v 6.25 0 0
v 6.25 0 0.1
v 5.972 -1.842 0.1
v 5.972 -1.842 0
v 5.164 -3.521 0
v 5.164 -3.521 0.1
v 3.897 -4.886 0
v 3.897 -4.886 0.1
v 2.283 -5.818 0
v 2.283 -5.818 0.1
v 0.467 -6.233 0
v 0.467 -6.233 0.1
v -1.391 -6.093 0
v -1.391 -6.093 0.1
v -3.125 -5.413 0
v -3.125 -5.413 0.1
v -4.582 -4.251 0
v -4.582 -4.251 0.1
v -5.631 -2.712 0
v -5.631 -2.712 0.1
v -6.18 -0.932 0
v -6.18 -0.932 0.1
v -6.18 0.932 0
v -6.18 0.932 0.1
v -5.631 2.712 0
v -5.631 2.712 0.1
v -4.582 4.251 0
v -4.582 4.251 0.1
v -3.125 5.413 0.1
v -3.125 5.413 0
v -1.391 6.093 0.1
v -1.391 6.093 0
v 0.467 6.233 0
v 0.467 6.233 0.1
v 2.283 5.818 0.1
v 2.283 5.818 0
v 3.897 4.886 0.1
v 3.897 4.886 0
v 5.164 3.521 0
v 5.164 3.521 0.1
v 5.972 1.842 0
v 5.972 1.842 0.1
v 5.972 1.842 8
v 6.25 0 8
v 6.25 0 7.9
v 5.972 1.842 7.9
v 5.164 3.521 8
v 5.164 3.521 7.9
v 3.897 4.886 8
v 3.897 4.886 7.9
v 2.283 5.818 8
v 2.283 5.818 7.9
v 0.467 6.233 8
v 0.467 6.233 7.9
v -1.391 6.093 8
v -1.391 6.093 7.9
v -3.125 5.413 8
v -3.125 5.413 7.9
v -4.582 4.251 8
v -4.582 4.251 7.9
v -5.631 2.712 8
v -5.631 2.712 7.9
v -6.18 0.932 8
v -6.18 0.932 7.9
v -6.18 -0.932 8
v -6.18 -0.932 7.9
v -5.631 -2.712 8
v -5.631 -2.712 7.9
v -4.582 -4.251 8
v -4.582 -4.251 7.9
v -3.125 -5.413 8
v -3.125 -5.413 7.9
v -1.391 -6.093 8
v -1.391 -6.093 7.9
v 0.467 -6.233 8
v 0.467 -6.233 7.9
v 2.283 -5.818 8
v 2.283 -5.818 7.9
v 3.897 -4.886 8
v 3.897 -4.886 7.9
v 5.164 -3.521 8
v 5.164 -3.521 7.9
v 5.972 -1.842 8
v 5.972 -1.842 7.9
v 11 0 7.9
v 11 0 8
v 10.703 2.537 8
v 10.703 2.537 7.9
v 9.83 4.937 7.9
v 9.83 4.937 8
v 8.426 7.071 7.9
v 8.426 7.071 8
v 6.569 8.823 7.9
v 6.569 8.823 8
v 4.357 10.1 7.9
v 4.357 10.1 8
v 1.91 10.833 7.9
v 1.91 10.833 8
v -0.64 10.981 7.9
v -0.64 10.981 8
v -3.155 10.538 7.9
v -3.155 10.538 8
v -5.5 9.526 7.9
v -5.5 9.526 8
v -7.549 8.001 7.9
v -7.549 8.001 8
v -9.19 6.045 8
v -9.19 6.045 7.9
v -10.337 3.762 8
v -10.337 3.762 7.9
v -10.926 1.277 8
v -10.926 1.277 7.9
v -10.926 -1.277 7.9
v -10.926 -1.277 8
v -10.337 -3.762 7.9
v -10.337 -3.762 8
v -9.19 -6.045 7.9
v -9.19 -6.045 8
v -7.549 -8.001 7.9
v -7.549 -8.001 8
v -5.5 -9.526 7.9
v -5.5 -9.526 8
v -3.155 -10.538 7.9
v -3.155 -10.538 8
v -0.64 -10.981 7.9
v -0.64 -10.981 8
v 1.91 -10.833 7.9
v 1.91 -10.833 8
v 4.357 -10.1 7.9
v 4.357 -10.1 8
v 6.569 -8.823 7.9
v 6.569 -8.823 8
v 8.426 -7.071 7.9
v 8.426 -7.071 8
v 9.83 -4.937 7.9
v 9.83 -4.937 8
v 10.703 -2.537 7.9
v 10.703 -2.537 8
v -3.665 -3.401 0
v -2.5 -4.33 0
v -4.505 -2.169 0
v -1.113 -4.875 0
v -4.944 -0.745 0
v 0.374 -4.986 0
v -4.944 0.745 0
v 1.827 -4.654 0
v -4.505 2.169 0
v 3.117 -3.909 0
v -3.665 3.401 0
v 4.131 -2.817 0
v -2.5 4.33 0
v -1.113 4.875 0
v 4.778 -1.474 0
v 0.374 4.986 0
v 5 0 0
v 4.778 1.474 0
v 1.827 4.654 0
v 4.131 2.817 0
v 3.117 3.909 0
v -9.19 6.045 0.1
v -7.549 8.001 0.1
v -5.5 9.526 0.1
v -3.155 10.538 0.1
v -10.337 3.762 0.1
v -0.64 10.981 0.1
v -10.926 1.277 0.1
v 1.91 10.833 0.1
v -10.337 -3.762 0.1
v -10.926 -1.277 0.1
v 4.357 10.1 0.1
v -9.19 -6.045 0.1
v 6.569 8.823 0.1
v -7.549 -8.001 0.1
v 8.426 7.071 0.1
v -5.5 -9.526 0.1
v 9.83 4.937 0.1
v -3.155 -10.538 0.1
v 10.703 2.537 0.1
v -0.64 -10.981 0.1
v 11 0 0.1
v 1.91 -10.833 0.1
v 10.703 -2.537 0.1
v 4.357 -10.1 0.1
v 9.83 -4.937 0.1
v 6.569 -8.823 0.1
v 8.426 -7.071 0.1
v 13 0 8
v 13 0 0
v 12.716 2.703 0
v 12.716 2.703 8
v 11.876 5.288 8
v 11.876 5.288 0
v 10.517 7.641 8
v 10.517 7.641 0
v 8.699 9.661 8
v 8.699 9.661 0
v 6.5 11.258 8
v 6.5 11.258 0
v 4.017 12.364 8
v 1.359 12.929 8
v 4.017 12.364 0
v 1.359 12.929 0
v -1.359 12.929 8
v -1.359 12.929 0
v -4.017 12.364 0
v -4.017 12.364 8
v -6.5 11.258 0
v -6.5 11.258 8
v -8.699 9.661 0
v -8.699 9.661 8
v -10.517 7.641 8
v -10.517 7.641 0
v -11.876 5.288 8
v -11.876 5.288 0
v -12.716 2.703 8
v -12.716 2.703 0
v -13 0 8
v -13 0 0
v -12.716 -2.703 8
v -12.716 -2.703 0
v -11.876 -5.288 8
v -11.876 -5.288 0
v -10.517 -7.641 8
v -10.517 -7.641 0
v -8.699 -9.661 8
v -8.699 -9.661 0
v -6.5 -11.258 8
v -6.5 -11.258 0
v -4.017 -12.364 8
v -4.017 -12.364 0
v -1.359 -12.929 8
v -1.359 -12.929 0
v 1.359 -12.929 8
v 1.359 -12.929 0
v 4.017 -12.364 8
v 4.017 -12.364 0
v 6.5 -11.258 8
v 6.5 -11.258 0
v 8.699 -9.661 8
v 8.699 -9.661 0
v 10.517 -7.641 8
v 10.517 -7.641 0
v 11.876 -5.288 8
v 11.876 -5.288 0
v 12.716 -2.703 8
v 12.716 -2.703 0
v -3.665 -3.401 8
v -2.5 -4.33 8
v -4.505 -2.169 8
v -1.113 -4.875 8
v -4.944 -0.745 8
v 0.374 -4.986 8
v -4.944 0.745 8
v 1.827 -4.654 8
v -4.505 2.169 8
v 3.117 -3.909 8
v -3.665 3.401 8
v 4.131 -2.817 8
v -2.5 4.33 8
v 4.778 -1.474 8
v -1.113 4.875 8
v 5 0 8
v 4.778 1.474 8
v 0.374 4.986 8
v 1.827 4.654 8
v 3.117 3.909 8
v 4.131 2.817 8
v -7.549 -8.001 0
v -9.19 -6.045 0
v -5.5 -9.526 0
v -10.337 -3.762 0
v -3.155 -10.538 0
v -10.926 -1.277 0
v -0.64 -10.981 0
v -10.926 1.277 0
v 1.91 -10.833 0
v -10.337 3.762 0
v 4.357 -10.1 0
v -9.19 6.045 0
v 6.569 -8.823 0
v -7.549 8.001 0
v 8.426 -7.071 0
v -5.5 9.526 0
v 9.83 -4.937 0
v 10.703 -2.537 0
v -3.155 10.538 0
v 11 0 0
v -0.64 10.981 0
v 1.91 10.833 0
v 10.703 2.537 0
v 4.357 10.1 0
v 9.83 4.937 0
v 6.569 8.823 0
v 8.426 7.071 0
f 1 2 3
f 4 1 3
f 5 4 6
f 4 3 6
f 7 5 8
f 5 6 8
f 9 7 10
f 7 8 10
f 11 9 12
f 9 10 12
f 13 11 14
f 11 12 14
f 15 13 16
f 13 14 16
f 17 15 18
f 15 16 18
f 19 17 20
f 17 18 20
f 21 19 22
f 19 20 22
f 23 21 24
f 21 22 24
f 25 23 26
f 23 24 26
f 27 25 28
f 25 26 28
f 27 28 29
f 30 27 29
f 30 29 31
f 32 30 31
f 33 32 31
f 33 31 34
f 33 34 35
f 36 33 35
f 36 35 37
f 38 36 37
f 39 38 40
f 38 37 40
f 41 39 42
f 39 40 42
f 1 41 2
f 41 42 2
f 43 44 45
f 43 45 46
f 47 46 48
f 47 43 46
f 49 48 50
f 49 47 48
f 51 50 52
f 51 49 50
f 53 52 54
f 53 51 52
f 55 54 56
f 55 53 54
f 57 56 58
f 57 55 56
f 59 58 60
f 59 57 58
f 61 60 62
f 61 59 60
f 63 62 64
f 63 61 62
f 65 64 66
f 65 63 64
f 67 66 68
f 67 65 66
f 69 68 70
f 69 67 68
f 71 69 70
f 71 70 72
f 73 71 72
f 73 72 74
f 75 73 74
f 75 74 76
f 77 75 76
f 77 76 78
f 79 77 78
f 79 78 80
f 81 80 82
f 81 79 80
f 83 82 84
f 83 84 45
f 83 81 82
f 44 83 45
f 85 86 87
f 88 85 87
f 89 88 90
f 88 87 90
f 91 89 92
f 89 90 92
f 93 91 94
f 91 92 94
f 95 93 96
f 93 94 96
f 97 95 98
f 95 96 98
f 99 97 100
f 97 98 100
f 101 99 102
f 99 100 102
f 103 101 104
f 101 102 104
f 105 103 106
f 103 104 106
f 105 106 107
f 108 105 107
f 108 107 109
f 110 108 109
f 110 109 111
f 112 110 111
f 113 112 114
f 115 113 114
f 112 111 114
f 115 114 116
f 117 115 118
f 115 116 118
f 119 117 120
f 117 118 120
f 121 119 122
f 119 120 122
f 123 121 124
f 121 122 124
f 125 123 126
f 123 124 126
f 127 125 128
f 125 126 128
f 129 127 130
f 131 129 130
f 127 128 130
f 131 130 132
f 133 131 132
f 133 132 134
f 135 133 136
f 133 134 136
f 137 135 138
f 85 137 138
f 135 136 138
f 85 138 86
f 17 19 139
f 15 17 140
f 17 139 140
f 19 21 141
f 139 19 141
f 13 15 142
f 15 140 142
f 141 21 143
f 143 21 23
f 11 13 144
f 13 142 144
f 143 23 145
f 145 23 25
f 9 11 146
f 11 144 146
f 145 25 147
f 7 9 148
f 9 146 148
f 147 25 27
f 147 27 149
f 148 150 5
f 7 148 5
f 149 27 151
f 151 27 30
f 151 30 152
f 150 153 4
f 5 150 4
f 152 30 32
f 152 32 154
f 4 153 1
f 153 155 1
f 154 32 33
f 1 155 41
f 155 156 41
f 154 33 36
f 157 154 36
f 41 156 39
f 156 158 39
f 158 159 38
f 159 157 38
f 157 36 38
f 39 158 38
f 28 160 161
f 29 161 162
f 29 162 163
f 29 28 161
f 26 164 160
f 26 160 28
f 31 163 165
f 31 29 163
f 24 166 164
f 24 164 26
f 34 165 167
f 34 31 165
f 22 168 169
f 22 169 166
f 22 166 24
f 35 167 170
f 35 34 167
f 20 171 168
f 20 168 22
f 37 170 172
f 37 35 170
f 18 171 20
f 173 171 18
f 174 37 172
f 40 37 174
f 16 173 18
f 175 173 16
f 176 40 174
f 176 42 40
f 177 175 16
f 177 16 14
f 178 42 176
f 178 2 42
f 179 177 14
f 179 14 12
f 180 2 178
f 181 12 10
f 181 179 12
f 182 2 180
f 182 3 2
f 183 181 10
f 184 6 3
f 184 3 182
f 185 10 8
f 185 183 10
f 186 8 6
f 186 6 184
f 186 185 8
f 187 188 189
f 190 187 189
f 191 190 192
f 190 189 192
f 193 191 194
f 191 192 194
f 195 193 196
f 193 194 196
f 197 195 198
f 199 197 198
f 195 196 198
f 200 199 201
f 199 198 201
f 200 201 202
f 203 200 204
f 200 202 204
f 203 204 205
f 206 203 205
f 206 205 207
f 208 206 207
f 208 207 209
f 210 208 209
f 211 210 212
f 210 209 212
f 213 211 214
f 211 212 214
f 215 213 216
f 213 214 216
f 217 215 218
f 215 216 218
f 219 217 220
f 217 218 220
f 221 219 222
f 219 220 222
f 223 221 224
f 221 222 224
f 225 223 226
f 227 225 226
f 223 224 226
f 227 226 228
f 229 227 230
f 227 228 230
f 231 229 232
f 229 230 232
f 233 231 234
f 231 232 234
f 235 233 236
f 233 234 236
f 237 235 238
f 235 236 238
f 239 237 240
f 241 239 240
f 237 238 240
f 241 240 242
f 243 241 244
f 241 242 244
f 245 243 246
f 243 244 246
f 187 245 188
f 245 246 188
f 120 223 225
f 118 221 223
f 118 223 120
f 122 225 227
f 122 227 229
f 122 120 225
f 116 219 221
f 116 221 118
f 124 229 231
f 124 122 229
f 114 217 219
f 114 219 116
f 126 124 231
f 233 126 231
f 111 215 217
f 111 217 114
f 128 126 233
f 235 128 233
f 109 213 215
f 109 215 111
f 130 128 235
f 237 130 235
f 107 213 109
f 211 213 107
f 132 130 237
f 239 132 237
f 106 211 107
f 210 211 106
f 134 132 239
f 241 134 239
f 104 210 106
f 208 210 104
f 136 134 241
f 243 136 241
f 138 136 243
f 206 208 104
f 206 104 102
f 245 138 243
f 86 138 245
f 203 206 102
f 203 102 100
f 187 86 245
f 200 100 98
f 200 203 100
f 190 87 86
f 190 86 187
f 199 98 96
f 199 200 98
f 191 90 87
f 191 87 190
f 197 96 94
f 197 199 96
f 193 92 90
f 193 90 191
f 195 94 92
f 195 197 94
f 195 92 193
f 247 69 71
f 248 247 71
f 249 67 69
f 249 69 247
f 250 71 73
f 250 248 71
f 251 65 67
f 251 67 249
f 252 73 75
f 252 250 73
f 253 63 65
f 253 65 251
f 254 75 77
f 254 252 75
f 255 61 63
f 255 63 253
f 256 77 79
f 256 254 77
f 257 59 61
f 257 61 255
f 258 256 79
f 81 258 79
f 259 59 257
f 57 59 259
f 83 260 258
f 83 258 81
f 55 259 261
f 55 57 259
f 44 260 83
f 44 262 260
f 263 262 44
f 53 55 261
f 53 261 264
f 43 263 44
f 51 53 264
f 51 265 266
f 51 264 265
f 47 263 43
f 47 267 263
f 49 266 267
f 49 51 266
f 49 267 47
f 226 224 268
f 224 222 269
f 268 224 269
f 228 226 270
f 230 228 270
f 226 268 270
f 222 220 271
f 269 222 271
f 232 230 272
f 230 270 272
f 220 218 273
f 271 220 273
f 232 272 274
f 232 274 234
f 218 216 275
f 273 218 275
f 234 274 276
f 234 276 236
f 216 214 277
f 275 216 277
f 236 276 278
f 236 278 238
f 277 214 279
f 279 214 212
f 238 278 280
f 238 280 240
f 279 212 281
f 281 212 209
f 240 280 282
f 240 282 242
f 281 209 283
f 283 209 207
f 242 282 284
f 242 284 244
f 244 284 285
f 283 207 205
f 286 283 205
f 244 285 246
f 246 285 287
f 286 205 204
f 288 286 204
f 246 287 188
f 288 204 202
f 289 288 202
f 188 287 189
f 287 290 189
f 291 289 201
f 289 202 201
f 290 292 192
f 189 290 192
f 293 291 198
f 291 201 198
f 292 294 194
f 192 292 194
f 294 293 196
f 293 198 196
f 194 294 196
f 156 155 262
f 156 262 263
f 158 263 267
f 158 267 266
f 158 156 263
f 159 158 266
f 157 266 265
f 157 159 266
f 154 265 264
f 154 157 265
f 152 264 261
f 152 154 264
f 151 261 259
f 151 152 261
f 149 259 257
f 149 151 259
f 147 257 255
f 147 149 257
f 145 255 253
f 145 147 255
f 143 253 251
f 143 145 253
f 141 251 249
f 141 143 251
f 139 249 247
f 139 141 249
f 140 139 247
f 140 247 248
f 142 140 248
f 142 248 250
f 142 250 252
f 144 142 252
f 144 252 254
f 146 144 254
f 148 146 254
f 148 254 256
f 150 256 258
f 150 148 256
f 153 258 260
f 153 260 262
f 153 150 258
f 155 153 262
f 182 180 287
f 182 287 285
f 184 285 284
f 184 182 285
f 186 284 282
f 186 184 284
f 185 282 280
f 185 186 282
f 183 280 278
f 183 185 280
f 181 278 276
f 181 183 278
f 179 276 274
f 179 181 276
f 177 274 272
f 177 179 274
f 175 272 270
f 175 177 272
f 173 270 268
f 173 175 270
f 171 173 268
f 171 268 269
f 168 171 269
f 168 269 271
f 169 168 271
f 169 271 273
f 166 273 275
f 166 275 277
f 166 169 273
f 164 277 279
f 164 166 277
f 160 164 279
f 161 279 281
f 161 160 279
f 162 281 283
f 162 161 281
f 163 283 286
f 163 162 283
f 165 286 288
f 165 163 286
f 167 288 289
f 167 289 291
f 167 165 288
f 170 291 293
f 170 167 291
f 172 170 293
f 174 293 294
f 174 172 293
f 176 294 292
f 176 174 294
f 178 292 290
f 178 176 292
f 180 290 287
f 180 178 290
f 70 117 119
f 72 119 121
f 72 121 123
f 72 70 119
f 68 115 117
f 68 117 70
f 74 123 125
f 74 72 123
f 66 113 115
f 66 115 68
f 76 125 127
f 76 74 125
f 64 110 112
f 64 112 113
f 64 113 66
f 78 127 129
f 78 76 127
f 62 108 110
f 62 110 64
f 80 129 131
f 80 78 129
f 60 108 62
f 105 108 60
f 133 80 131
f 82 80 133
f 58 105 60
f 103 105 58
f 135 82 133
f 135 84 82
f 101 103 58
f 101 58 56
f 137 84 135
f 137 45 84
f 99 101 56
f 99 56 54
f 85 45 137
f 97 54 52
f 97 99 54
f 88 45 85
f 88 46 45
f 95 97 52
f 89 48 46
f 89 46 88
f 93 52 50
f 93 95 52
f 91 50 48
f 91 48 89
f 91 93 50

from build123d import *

# Parameters (mm, degrees)
CROQUIS1_R              = 13
CROQUIS1_R_2            = 5
SALIENTE_EXTRUIR1_DEPTH = 8
CROQUIS2_R              = 11
CROQUIS2_R_2            = 6.25
CORTAR_EXTRUIR1_DEPTH   = 0.1
CORTAR_EXTRUIR2_START   = -0.1
CROQUIS3_R              = 11
CROQUIS3_R_2            = 6.25
CORTAR_EXTRUIR2_DEPTH   = 0.1


with BuildPart() as part:
    # Croquis1 → Saliente-Extruir1 (new body)
    with BuildSketch(Plane.XY):
        Circle(CROQUIS1_R)
        Circle(CROQUIS1_R_2, mode=Mode.SUBTRACT)
    extrude(amount=SALIENTE_EXTRUIR1_DEPTH)

    # Croquis2 → Cortar-Extruir1 (cut)
    with BuildSketch(Plane.XY.offset(8)):
        Circle(CROQUIS2_R)
        Circle(CROQUIS2_R_2, mode=Mode.SUBTRACT)
    extrude(amount=-CORTAR_EXTRUIR1_DEPTH, mode=Mode.SUBTRACT)

    # Croquis3 → Cortar-Extruir2 (cut)
    with BuildSketch(Plane(origin=(0, 0, 0), x_dir=(-1, 0, 0), z_dir=(0, 0, -1)).offset(CORTAR_EXTRUIR2_START)):
        with Locations(Location((0, 0, 0), (0, 0, 180))):
            Circle(CROQUIS3_R)
        with Locations(Location((0, 0, 0), (0, 0, 180))):
            Circle(CROQUIS3_R_2, mode=Mode.SUBTRACT)
    extrude(amount=CORTAR_EXTRUIR2_DEPTH, mode=Mode.SUBTRACT)


solid = part.part
